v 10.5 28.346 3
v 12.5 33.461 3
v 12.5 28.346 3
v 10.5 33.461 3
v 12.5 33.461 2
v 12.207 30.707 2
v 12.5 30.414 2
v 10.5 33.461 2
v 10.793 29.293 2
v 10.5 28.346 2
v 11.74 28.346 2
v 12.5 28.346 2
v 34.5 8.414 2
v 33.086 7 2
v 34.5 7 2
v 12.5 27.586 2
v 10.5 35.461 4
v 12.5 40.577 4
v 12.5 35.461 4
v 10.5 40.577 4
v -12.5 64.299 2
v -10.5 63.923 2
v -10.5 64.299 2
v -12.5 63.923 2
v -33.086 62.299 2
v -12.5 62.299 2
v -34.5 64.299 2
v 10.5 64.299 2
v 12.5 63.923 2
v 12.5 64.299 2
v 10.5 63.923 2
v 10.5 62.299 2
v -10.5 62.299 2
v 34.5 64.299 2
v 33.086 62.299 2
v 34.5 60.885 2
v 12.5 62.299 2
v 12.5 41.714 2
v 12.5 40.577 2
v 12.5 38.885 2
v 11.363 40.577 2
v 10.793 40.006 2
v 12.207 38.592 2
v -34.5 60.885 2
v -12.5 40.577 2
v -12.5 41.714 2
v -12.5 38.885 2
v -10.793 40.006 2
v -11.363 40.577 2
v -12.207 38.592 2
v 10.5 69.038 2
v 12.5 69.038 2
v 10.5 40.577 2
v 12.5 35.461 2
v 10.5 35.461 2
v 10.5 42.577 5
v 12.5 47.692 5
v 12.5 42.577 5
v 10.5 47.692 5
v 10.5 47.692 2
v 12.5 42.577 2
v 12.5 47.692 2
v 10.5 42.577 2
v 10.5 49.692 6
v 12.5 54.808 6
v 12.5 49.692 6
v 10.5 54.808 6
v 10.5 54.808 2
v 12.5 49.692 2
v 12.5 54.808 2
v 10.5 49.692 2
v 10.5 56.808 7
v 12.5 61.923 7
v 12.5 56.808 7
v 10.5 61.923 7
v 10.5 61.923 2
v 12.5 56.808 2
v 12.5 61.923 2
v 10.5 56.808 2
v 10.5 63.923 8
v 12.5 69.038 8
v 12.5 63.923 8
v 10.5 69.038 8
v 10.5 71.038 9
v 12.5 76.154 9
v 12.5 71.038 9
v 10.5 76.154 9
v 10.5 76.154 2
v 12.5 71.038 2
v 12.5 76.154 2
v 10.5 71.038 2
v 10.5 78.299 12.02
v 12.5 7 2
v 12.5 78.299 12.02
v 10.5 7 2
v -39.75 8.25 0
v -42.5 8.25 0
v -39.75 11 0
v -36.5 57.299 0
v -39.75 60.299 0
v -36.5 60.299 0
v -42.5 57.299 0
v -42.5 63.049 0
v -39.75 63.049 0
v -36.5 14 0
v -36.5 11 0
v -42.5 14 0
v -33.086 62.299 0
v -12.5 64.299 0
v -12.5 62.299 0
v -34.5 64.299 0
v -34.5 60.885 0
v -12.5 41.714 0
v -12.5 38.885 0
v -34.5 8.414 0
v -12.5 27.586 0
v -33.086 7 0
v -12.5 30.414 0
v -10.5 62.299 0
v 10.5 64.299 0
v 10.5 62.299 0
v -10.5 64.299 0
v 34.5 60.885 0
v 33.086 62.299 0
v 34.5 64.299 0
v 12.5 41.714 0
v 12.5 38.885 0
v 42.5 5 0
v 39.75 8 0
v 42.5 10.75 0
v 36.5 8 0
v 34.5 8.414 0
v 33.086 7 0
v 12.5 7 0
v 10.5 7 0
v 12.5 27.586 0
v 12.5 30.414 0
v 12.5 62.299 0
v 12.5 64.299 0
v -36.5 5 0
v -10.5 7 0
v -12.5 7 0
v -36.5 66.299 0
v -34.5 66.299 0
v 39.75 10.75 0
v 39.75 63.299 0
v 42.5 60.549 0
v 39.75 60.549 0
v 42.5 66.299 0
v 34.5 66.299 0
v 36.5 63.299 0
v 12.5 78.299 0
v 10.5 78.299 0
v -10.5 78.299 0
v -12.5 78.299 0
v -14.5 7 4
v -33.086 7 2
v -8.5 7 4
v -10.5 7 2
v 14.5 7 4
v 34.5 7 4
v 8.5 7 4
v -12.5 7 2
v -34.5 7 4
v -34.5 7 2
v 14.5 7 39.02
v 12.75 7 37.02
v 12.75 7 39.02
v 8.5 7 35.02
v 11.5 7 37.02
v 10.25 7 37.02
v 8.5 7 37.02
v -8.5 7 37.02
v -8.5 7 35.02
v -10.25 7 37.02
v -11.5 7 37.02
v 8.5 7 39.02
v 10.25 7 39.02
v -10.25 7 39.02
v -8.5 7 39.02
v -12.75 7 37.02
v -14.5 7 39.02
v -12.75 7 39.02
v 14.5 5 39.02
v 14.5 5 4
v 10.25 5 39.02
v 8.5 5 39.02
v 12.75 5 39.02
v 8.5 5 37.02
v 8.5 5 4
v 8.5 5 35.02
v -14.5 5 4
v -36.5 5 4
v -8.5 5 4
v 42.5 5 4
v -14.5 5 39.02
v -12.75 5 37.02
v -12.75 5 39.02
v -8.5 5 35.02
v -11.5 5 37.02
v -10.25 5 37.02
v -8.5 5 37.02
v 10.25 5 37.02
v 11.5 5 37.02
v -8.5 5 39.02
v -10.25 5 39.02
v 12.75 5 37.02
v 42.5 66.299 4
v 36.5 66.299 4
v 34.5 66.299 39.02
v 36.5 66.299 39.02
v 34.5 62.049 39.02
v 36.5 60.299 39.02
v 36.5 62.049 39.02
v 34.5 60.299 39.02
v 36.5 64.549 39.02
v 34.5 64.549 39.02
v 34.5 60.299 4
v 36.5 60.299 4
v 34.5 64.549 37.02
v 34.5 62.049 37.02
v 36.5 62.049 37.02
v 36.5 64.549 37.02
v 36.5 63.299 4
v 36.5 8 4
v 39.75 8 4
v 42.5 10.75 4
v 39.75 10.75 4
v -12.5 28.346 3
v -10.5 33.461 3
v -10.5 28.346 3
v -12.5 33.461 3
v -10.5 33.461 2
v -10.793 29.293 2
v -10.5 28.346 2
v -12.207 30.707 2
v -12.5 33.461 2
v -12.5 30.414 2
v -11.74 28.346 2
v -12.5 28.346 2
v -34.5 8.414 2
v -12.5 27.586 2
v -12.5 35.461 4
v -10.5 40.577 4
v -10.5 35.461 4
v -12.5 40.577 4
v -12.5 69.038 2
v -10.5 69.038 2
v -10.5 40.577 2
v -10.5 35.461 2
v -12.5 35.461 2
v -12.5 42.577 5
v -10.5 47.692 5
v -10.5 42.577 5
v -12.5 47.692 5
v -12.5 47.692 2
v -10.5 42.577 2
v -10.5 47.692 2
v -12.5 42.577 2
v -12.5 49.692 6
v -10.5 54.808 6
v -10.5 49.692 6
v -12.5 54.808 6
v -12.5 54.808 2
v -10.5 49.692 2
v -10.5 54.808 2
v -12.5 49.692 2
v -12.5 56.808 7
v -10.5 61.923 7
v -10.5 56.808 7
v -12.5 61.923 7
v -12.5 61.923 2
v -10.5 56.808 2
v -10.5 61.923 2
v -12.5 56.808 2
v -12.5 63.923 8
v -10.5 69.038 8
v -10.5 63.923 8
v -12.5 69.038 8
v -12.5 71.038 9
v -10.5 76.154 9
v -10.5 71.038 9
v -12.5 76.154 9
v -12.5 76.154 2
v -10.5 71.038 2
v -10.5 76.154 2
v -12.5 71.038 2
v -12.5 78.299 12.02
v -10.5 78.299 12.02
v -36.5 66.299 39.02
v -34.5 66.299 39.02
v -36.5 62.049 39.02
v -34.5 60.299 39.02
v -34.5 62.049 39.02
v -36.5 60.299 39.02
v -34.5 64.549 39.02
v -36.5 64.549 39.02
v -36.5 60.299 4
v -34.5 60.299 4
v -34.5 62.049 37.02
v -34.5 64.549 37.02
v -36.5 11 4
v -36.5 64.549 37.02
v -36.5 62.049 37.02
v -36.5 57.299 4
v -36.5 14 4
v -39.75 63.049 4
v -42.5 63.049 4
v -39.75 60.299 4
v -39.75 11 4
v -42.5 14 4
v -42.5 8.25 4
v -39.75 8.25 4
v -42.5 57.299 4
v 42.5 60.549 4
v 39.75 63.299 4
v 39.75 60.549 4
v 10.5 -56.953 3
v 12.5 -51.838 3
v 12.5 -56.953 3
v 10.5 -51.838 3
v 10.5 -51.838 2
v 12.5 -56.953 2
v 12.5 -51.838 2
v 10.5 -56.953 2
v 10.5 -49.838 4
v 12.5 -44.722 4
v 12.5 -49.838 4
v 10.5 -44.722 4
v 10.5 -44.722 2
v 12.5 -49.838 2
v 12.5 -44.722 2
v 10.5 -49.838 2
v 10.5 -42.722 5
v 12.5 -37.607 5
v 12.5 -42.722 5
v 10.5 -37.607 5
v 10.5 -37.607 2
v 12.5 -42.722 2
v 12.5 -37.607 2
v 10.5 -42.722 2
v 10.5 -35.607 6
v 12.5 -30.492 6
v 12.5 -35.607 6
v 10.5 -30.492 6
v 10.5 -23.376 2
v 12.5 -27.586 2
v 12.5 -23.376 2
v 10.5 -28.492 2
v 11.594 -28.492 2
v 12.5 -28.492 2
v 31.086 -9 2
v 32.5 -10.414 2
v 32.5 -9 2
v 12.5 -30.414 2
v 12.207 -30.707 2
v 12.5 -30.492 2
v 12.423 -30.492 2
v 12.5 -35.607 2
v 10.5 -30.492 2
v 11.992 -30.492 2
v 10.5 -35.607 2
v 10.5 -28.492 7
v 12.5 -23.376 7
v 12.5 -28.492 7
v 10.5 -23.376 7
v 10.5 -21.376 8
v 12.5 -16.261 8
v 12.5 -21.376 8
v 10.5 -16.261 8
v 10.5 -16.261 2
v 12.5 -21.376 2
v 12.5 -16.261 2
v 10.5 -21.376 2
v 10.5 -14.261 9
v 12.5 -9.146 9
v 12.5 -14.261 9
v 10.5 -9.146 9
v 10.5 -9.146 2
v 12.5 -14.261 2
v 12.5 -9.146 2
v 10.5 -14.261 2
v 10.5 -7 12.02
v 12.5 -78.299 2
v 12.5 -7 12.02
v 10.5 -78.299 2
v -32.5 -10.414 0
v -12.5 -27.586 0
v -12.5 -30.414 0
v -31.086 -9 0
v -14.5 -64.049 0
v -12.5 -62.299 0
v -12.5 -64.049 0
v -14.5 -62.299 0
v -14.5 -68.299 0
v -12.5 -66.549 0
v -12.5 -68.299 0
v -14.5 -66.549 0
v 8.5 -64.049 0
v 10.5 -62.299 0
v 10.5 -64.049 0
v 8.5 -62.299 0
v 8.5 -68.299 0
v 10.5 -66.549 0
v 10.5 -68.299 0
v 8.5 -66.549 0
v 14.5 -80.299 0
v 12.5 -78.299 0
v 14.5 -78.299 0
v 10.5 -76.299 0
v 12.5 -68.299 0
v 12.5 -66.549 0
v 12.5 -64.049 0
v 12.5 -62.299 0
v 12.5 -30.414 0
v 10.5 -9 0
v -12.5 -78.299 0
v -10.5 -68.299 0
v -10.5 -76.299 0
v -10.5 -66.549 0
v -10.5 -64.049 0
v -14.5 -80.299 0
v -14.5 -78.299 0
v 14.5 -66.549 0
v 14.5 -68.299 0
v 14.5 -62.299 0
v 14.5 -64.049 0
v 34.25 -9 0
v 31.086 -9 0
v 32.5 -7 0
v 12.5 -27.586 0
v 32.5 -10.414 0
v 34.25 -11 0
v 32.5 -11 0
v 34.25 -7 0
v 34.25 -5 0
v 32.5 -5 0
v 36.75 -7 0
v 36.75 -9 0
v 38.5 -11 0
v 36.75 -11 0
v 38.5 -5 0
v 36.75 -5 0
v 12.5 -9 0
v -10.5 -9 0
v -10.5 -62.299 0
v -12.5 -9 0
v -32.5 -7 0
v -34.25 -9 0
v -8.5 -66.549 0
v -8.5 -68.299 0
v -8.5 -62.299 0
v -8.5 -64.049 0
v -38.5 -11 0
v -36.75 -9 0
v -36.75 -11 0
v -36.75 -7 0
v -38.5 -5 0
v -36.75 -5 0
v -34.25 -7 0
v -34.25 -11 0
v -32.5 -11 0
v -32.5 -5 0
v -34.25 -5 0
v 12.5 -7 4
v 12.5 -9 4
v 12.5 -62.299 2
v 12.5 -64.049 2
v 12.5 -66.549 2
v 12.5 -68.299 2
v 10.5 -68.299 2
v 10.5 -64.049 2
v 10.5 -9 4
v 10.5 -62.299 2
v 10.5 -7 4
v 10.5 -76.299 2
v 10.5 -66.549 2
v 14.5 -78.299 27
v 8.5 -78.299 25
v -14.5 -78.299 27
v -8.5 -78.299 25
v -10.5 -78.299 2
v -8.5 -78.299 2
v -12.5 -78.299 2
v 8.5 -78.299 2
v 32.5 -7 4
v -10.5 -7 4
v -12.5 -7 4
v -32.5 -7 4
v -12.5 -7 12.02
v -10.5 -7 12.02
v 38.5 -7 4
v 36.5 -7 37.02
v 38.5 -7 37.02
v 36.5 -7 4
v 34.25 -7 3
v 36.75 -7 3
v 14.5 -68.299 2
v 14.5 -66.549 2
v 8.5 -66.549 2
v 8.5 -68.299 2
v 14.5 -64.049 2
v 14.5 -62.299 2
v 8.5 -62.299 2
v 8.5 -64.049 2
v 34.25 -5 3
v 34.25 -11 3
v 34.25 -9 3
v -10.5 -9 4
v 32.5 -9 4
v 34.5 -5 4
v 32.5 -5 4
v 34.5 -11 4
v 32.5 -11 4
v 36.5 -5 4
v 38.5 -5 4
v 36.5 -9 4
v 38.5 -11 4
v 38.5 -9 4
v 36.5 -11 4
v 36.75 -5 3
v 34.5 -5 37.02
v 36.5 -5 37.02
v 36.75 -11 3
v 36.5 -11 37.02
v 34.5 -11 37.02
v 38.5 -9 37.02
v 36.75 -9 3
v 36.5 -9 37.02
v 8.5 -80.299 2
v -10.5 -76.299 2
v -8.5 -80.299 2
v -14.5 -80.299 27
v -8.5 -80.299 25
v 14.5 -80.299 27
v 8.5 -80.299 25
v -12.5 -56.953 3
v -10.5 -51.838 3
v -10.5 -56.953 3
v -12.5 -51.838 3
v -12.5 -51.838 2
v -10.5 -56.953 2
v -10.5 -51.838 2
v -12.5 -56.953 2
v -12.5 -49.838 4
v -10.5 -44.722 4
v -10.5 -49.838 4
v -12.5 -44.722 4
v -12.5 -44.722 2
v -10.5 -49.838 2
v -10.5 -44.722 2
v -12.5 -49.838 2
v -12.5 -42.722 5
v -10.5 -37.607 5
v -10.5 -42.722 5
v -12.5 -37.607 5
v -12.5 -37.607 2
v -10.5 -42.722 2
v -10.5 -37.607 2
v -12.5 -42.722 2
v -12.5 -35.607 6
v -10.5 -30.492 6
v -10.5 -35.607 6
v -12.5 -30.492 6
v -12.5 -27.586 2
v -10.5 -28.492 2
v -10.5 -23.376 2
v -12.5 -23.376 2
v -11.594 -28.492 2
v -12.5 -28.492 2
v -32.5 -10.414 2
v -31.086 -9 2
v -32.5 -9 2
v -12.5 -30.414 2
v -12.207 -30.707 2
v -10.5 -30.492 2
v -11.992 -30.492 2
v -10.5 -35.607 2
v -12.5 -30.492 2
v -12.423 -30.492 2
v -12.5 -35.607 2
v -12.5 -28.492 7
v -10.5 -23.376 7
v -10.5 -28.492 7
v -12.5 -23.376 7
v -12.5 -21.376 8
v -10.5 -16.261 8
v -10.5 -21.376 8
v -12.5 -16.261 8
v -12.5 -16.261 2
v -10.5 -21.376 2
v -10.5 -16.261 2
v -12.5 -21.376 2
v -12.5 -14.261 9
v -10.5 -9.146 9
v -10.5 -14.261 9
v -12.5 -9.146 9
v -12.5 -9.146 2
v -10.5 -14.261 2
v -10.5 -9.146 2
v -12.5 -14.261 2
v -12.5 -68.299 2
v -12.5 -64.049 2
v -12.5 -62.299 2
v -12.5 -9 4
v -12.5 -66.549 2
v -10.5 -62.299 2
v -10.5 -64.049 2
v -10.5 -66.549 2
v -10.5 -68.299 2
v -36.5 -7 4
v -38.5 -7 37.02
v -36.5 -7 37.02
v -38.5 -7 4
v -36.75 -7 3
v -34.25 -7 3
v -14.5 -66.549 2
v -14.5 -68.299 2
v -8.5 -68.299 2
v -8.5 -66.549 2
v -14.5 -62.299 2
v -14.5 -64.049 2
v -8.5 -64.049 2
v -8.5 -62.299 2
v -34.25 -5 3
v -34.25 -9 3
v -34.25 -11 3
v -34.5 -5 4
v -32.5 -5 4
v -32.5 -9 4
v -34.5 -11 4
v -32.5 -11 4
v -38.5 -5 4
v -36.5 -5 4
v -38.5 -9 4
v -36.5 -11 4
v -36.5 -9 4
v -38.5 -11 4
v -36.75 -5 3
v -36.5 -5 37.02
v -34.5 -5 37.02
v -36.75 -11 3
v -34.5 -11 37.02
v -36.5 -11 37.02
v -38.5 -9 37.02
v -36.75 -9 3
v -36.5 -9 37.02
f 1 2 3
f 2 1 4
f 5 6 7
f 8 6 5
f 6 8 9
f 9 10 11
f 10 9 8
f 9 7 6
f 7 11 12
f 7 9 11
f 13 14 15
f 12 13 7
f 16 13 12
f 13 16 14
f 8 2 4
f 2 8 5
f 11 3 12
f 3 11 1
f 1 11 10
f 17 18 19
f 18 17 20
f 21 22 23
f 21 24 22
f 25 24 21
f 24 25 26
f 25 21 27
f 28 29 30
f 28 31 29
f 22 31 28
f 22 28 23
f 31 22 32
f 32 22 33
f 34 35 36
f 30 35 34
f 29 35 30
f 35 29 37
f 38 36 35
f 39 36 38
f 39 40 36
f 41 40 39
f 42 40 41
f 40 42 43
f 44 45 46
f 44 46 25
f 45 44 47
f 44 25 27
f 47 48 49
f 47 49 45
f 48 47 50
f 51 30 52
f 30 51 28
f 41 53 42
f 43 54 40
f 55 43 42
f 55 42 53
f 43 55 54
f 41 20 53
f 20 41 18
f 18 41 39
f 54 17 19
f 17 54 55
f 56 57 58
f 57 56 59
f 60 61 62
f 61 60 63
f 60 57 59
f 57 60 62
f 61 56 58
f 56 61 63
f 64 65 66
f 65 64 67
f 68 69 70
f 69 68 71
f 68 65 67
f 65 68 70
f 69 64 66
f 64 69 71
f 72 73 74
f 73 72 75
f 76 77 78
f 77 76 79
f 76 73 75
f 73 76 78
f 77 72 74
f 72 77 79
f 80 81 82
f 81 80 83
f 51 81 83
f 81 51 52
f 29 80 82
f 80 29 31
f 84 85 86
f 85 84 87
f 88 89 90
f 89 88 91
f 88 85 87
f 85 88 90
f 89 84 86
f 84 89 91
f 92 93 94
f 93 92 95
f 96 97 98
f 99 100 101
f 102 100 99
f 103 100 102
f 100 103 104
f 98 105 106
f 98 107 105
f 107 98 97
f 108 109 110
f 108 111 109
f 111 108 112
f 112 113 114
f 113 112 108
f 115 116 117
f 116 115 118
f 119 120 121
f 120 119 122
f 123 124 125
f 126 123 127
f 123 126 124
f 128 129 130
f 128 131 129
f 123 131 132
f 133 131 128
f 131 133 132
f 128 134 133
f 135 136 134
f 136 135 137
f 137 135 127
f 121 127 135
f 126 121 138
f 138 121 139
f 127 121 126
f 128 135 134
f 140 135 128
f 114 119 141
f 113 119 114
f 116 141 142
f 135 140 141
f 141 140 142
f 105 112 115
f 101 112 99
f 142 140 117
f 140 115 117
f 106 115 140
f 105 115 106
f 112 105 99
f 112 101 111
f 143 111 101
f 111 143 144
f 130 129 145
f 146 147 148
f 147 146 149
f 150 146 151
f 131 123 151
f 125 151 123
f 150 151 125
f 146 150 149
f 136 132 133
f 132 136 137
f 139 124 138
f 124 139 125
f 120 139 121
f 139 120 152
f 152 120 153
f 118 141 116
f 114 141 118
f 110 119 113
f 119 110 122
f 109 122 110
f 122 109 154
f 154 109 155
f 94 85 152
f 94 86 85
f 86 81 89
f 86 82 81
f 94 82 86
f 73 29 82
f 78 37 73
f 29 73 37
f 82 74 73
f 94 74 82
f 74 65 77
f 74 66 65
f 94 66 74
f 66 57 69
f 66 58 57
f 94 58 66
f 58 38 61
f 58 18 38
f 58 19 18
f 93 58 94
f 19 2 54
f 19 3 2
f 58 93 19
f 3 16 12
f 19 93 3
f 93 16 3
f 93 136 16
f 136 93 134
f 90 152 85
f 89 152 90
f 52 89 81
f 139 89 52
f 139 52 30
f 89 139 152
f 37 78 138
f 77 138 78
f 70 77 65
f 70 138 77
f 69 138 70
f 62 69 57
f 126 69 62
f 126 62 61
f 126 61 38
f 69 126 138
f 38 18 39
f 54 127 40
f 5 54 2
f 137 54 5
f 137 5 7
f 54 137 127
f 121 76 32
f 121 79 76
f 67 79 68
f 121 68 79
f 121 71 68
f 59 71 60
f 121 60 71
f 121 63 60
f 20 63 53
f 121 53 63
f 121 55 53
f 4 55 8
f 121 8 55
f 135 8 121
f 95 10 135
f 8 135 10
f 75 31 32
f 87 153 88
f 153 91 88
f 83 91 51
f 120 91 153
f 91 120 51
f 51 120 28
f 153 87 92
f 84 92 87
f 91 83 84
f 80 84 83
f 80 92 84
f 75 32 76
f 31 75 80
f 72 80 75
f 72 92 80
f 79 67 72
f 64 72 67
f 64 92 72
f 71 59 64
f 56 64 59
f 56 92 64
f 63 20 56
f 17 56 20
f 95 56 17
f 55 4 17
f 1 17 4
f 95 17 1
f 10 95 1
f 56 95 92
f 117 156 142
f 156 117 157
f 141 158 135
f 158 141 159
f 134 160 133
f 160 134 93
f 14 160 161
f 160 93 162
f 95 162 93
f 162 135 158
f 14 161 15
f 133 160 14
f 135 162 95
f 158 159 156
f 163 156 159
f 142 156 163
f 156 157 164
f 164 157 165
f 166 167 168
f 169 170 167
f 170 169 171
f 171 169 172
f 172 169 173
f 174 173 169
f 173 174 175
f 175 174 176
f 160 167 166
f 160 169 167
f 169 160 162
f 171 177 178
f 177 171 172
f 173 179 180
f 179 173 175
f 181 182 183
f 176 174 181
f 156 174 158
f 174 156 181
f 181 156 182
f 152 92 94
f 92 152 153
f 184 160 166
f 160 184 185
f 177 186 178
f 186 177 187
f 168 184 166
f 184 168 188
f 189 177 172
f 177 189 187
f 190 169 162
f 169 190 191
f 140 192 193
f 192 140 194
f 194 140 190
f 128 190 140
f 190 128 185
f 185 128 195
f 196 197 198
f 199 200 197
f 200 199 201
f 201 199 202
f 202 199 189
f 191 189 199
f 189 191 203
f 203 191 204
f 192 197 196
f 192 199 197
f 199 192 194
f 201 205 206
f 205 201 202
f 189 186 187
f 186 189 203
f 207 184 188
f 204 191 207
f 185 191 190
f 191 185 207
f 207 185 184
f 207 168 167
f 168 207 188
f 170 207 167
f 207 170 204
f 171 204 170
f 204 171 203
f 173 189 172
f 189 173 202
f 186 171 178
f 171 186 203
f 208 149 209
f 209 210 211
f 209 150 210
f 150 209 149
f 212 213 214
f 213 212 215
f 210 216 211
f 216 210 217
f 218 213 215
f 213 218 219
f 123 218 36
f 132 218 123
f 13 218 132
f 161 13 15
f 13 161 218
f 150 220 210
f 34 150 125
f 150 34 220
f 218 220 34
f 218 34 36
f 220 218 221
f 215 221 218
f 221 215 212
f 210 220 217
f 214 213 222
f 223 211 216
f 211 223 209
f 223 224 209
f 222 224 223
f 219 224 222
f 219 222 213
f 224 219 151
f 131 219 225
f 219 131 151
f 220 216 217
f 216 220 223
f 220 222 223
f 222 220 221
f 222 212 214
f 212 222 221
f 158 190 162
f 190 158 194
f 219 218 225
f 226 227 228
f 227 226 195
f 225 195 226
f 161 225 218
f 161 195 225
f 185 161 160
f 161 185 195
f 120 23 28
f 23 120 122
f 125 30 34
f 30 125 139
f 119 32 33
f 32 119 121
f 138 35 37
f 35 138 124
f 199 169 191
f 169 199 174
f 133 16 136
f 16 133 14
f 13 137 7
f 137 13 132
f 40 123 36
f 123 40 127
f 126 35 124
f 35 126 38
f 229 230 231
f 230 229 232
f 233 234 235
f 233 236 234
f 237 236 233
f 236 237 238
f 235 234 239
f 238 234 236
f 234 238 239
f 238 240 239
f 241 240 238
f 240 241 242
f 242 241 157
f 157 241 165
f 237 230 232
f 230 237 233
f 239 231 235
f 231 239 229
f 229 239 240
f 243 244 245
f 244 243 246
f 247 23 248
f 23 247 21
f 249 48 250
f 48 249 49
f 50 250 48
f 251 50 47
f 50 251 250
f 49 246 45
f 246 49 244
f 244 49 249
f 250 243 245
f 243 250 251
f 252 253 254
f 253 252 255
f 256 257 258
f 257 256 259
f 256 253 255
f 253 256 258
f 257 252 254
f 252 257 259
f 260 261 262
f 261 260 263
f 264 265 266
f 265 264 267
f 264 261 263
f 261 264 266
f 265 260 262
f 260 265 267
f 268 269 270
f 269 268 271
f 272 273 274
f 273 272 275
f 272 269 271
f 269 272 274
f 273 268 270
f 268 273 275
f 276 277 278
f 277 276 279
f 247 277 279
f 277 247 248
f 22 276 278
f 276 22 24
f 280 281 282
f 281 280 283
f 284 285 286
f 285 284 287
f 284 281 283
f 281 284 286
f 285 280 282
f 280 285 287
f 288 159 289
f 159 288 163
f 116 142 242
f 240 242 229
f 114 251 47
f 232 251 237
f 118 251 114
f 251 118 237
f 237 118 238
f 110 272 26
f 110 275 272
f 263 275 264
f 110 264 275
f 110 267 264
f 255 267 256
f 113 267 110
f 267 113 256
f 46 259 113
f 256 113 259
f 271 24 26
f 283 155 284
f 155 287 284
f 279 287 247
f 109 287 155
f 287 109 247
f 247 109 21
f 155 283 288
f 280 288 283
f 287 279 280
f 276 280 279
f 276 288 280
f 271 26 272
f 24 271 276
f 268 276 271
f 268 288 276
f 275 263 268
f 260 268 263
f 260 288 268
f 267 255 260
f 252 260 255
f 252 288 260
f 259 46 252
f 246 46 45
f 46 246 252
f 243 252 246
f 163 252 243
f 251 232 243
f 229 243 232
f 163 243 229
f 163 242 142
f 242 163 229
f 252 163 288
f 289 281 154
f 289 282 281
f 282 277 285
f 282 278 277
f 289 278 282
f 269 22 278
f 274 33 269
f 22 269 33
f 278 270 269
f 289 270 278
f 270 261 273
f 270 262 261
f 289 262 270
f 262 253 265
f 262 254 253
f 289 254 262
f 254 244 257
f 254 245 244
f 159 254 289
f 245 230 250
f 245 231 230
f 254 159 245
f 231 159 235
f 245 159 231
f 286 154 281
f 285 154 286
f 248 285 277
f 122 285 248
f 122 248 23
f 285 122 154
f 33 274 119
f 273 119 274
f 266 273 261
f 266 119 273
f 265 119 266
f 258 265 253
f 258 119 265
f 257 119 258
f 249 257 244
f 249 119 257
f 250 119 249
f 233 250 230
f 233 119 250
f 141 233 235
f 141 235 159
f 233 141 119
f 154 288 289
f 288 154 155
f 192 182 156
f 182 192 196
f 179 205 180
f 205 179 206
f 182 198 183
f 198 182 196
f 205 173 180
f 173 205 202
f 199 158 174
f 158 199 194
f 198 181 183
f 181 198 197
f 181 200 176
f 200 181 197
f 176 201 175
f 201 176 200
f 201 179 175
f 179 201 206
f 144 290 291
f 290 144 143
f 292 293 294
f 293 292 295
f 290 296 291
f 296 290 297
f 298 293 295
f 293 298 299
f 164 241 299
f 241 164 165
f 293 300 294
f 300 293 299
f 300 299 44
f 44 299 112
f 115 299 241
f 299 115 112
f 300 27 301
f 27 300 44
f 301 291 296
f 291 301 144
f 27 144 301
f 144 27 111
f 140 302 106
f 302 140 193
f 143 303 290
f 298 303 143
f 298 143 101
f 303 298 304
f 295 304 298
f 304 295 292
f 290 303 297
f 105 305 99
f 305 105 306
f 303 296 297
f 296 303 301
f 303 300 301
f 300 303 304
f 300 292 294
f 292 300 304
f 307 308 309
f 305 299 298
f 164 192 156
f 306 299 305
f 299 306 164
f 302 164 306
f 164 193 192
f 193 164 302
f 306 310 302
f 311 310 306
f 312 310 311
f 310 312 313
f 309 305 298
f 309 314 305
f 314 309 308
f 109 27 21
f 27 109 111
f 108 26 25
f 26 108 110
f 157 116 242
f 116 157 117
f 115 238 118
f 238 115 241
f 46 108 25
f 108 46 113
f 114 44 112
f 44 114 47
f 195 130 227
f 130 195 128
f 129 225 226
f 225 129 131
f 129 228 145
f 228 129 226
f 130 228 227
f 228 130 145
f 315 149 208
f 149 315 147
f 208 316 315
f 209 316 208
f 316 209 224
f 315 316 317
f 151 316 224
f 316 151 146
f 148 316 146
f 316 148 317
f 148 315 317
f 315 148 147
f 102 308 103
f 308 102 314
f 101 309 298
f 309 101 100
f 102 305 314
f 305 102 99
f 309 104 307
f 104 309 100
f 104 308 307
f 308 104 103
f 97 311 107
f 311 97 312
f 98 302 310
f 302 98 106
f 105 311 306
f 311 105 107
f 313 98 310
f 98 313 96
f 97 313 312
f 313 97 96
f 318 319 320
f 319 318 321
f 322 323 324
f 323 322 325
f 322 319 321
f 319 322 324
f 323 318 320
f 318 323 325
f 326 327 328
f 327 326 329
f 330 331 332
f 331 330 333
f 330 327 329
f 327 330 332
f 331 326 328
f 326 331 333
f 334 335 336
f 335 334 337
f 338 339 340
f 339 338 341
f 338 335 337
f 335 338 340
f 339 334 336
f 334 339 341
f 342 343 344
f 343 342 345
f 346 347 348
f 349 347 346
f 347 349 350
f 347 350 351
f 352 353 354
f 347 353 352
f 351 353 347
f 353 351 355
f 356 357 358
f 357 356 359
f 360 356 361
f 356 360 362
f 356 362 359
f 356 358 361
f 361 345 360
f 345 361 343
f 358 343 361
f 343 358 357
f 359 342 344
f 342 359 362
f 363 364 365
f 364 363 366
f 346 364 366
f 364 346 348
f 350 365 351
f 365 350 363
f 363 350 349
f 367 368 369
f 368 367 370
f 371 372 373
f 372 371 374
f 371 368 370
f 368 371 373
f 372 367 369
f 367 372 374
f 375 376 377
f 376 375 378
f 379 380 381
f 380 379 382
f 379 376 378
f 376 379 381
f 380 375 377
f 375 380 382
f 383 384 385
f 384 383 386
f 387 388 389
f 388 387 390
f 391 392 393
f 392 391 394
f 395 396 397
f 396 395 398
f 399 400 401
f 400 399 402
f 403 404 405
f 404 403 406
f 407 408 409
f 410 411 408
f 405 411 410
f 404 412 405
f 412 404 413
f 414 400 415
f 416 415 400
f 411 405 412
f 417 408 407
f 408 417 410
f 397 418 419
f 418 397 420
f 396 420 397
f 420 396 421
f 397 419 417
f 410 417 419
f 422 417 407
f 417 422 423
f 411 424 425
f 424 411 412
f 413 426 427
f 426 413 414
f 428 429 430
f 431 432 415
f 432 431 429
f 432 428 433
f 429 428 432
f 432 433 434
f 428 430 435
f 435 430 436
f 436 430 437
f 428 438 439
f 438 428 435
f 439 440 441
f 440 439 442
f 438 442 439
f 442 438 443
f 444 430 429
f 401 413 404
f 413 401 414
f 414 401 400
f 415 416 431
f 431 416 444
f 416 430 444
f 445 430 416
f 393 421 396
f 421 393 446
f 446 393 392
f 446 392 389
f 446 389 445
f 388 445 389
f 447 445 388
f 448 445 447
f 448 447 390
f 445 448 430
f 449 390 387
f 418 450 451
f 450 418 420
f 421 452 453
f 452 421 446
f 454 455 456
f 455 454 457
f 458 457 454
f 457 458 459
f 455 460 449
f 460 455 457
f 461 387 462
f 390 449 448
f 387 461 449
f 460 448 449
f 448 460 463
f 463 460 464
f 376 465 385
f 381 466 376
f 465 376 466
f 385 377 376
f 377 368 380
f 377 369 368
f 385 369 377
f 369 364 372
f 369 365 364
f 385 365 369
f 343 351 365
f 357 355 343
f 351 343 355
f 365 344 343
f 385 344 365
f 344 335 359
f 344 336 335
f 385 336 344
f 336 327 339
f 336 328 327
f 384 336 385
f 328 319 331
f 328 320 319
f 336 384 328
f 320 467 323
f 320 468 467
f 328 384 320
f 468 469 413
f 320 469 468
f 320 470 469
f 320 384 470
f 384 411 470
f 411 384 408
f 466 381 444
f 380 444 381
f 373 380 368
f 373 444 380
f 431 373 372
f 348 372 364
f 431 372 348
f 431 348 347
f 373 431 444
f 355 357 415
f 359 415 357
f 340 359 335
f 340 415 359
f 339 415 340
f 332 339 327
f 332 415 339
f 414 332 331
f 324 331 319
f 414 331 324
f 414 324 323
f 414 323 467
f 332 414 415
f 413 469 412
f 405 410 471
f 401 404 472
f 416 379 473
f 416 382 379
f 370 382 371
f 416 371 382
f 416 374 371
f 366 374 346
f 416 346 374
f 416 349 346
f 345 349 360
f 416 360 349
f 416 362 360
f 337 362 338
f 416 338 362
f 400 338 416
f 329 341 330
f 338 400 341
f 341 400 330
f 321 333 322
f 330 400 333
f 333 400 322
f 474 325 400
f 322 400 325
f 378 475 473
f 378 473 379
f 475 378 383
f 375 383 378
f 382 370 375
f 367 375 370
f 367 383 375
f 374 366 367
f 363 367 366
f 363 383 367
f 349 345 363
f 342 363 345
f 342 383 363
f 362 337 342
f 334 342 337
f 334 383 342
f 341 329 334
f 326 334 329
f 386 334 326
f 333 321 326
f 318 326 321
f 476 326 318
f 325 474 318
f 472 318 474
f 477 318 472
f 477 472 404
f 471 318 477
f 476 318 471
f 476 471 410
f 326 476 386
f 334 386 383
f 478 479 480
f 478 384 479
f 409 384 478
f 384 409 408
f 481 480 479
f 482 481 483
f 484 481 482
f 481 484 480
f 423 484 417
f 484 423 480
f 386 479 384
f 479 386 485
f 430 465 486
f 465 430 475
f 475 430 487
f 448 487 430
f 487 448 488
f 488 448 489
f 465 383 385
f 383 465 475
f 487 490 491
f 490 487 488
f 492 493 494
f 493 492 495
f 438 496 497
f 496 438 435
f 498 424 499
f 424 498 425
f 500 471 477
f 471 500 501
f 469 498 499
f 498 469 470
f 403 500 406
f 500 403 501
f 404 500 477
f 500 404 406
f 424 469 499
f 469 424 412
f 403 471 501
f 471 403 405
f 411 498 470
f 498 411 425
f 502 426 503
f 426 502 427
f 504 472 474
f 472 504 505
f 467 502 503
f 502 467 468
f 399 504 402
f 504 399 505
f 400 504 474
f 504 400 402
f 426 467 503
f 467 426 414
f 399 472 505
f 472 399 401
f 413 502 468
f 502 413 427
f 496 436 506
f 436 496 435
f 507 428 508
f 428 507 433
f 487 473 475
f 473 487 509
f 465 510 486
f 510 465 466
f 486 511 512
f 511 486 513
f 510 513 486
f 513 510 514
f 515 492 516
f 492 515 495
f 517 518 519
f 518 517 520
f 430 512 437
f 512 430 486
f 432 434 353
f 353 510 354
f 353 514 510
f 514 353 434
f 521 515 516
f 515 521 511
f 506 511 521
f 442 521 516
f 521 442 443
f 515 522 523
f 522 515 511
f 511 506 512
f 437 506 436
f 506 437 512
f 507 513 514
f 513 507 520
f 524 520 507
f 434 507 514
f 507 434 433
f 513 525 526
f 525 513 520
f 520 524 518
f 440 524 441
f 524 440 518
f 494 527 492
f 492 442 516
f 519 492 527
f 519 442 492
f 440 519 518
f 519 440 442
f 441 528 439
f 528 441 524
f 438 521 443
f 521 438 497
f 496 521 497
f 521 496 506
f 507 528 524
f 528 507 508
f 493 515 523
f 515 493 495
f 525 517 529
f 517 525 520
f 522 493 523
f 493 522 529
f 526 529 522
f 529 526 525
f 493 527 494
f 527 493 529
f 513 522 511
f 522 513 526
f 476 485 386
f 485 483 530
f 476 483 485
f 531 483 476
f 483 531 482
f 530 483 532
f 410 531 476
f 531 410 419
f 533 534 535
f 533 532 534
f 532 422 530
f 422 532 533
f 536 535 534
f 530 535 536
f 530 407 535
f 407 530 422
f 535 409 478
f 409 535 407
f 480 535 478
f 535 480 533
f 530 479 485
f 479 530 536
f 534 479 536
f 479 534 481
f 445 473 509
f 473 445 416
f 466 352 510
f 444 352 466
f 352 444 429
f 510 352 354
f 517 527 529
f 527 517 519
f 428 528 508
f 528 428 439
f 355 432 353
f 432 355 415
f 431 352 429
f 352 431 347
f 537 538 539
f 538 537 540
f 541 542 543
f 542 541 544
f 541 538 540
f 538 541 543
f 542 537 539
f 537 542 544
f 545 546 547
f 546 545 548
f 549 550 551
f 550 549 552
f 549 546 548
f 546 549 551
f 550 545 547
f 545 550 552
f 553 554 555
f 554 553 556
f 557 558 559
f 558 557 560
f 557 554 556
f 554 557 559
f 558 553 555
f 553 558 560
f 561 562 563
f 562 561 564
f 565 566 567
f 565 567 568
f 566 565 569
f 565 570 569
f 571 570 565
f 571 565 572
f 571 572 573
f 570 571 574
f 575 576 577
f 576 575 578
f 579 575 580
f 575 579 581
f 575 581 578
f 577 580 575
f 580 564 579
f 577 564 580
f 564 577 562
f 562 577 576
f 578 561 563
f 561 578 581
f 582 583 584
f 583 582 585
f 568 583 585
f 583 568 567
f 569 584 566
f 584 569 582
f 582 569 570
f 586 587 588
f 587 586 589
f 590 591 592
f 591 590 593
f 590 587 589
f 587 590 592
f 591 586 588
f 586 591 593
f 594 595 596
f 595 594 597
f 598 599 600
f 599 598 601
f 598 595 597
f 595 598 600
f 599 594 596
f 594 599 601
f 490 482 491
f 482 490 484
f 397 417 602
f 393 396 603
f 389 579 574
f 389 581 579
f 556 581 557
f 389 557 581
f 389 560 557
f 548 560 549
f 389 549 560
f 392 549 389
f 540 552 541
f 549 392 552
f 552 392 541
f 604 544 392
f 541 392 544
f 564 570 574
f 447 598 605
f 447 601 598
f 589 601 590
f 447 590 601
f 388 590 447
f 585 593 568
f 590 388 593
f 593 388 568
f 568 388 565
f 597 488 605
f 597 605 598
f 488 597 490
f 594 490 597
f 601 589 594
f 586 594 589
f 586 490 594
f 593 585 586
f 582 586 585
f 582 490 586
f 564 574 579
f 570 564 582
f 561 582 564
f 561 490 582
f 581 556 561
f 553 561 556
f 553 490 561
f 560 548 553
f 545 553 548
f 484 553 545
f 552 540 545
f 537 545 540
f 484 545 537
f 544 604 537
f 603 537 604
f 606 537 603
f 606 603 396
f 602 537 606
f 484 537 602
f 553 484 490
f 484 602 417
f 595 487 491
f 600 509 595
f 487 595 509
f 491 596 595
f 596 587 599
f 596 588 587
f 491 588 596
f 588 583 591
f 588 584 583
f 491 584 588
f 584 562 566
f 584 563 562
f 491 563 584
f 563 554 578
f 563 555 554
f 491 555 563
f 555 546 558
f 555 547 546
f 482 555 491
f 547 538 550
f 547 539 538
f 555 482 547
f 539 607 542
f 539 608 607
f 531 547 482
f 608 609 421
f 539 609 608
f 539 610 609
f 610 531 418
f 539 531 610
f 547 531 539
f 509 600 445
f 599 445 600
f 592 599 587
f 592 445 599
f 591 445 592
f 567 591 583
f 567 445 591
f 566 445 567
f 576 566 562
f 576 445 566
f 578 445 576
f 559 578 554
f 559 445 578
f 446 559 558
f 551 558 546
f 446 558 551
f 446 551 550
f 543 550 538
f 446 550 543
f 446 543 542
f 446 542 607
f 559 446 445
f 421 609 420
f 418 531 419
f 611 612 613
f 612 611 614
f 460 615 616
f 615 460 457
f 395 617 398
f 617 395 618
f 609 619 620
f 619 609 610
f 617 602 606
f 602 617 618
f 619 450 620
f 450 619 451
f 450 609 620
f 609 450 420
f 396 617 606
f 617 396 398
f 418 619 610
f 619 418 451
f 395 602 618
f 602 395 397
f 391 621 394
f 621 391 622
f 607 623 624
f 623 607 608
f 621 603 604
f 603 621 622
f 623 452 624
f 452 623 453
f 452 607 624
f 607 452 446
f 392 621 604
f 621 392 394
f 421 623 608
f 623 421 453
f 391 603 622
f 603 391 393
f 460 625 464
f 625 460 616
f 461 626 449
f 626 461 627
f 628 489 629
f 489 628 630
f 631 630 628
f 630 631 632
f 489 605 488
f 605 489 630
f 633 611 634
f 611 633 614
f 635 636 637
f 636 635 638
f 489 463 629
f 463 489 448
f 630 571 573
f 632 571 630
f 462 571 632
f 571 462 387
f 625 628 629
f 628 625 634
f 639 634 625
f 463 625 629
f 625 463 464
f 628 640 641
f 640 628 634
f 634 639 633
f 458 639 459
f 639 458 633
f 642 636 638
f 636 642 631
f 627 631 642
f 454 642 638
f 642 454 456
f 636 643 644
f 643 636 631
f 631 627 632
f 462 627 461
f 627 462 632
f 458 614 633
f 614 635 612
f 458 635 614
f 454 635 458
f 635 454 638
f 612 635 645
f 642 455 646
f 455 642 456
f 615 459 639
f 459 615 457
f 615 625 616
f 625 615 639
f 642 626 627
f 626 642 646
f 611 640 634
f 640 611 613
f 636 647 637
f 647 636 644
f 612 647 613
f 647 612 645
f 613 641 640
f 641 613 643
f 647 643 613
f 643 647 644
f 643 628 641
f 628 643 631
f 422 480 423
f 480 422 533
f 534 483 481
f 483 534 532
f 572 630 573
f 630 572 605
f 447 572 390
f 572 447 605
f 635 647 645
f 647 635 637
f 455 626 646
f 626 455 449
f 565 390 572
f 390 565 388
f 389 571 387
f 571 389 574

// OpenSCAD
/* [Main] */

// What would you like to generate?
part = "both"; // [base:Base Only,top:Top Only,both:Base and Top]

// Number of holders
holder_count = 1;

// Width of cards to be used (mm)
card_width = 64;

// Length of cards to be used (mm)
card_length = 88;

// Height of holder (approx height of deck) (mm)
holder_height = 25;	// Height of holder

/* [Tweaking] */

// How far back the top layer should be (mm)
top_offset = 14;
// How much the cards overhang the ends of the holder (mm)
overhang = 16;
// The angle of the angled supports (degrees)
angle = 8;
// Gap added to card with to give width of holder (mm)
card_gap = 5;
// Thickness of support bars (mm)
bar_thickness = 2;
// Gap to allow top/bottom to clip together (mm)
support_gap = 0.25;
// Gap to allow clips to clip together (mm)
clip_card_gap = 0.25;
// Distance between top and bottom if printing both (mm)
both_gap = 10;


/****************************************
 *
 ****************************************/

// Internal width of holder
holder_width = card_width + card_gap;
// Length of angled support
angled_length = cos(angle) * (card_length - overhang);;
// Height of angled support
angled_height = (tan(angle) * angled_length) + bar_thickness;
// Length of base (for side bars)
base_length = angled_length - top_offset;
// Full length of base
base_full_length = angled_length + bar_thickness;
// Full length of top
top_full_length = angled_length + (bar_thickness * 2);
// Thickness of clips
clip_thickness = bar_thickness * 1.5;
// Offset of angled support from middle (1/6th from 1/2 = 1/3rd!)
offset = (holder_width) / 6;
// Offset for diagonal bars
diag_offset = sin(45) * bar_thickness;

print_part();

/****************************************
 * Generate the selected part
 ****************************************/
module print_part()
{
	if (part == "base")
	{
		bases();
	} else if (part == "top") {
		tops();
	} else if (part == "both") {
		// translate stuff here...
		translate([0, (base_full_length + both_gap) / 2, 0])
			bases();
		translate([0, -(top_full_length + both_gap) / 2, 0])
			tops();
	}
}

/****************************************
 * Generate the correct number of tops
 ****************************************/
module tops()
{
	// Calculate the full width of the tops
	full_width = (holder_width + bar_thickness) * (holder_count) + (bar_thickness * 3);
	// Centre the tops around zero
	translate([full_width/2, -top_full_length/2, 0])
	{
		// Draw each top
		for(i=[1:holder_count])
		{
			translate([-(holder_width + bar_thickness) * (i-1),0,0])
				singleTop();
		}

		// Thicker bars at ends
		translate([-bar_thickness, angled_length, 0])
		{
			cube([bar_thickness, bar_thickness, holder_height + angled_height]);
		}
		translate([-full_width, angled_length, 0])
		{
			cube([bar_thickness, bar_thickness, holder_height + angled_height]);
		}
	}
}

/****************************************
 * Generate a single top holder
 ****************************************/
module singleTop()
{
	// Length of diagonal bar
	diag_length = 
		(
			(offset*2 - bar_thickness)	// Distance between middle of angled support
												// 	and inside edge of side bar
			+ (diag_offset/2) 				// Distance from inside edge of side bar 
												//		to rotation axis of diagional bar
			+ (bar_thickness-diag_offset)	// Distance from rotation axis 
												//		to centre of diagonal bar
		) / sin(45);

	// Move the holder to start at [0,0,0]
	translate([-holder_width/2-(bar_thickness*2),0,0])
	{
		// As the base is mirrored down the middle, do a side at a time
		for (m=[[0,0,0],[1,0,0]])
		{
			mirror(m)
			{
				// Bar at back
				cube([offset, bar_thickness * 2, bar_thickness]);

				// Support at back
				translate([offset-(bar_thickness * 1.5),0,0])
					cube([bar_thickness * 3, bar_thickness, holder_height + bar_thickness]);
				translate([0,0,holder_height])
					cube([offset, bar_thickness, bar_thickness]);

				// Angled Support
				translate([offset-(bar_thickness * 0.5),bar_thickness,0])
					angledSupport();

				// Notches
				translate([offset-(bar_thickness * 1.5), 0, 0])
				{
					for(s=[
								[0, top_offset - bar_thickness, 0],
								[0, top_offset + bar_thickness + support_gap, 0]
							])
					{
						translate(s)
							cube([bar_thickness * 3, bar_thickness - support_gap, bar_thickness]);
					}
				}

				// Bar at front
				translate([0, angled_length, 0])
					cube([holder_width/2 + (bar_thickness * 2), bar_thickness, bar_thickness * 2]);

				// Front support
				translate([holder_width/2 - bar_thickness, angled_length - bar_thickness, 0])
				{
					for(t=[
							[0, 0, 0],
							[bar_thickness*2 + support_gap, 0, 0]
						])
					{
						translate(t)
							cube([bar_thickness - support_gap, bar_thickness * 3, bar_thickness * 2]);
					}

					translate([0, 0, bar_thickness * 1.5])
						cube([bar_thickness * 3, bar_thickness * 3, bar_thickness * 0.5]);

					// Vertical support
					translate([bar_thickness,0,bar_thickness * 1.5])
					{
						cube([bar_thickness, 
								bar_thickness * 3, 
								holder_height + angled_height - (bar_thickness * 1.5)]);
					}
				}

				// Diagonal supports
				translate([holder_width/2, angled_length + bar_thickness - diag_offset, 0])
					rotate([0,0,135])
						cube([bar_thickness,diag_length,bar_thickness]);
			}
		}
	}	
}

/****************************************
 * Generate the correct number of bases
 ****************************************/
module bases()
{
	// Move bases so generated object is in middle of area
	translate([
			((holder_width * holder_count) + (bar_thickness * (holder_count + 1)))/2,
			-base_full_length/2,
			0])
	{
		// Draw each base
		for(i=[1:holder_count])
		{
			translate([-(holder_width + bar_thickness) * (i-1),0,0])
				singleBase();
		}

		// Add the clips - all mirrored/rotated in their own way

		clip();

		translate([0,base_length + (bar_thickness * 2),0])
			mirror([0,1,0])
				clip();	

		translate([-(holder_width + bar_thickness) * (holder_count) - bar_thickness,
						base_length + (bar_thickness * 2) - (clip_thickness * 3),
						0])
			mirror([1,0,0])
				clip();

		translate([-(holder_width + bar_thickness) * (holder_count) - bar_thickness,
						(clip_thickness * 3),
						0])
			rotate([0,0,180])
				clip();

	}
}

/****************************************
 * Generate a single base
 ****************************************/
module singleBase()
{
	// Length of diagonal bar
	diag_length = 
		(
			(offset*2) 						// Distance between middle of angled support
												// 	and inside edge of side bar
			+ (diag_offset/2) 				// Distance from inside edge of side bar 
												//		to rotation axis of diagional bar
			+ (bar_thickness-diag_offset)	// Distance from rotation axis 
												//		to centre of diagonal bar
		) / sin(45);

	// Move so the base is at [0,0,0]
	translate([-holder_width/2-bar_thickness,0,0])
	{
		// As the base is mirrored down the middle, do a side at a time
		for (m=[[0,0,0],[1,0,0]])
		{
			mirror(m)
			{
				// Bar at back
				cube([holder_width/2, bar_thickness, bar_thickness * 2]);
				// Bar at front
				translate([0,base_length,0])
					cube([holder_width/2, bar_thickness, bar_thickness]);
				// Bar at top of back support
				translate([0,0,holder_height + angled_height - bar_thickness])
					cube([offset, bar_thickness, bar_thickness]);		

				// Side bar
				translate([holder_width/2,0,0])
					cube([bar_thickness, base_length + bar_thickness, bar_thickness * 2]);

				// angled Support
				translate([offset-(bar_thickness * 0.5),bar_thickness,0])
					angledSupport();

				// Back support
				translate([offset-(bar_thickness * 1.5),0,0])
					verticalSupport();
				// Front support
				translate([holder_width/2 + bar_thickness,base_length - bar_thickness,0])
					rotate([0,0,90])
						verticalSupport();

				// Diagonal at back
				translate([holder_width/2 + (bar_thickness - diag_offset), 0, 0])
					rotate([0,0,45])
						cube([bar_thickness,diag_length,bar_thickness]);
				// Diagonal at front
				translate([holder_width/2 + bar_thickness, base_length + bar_thickness - diag_offset, 0])
					rotate([0,0,135])
						cube([bar_thickness,diag_length,bar_thickness]);
			}
		}
	}
}

/****************************************
 * Angled support for cards to sit on
 ****************************************/
module angledSupport()
{
	// Calculate the maximum height of holes
	max_hole = floor(
		((angled_length - (bar_thickness * 2)) * tan(angle))
		- bar_thickness);

	difference()
	{
		// The triangle, with a bar of bar_thickness underneath
		polyhedron(points=[ 
			[0,0,0], [bar_thickness,0,0], 
			[0,angled_length,0], [bar_thickness,angled_length,0],
			[0,angled_length,angled_height], [bar_thickness,angled_length,angled_height],
			[0,0,bar_thickness], [bar_thickness,0,bar_thickness] ],
			// ONLY STILL TRIANGLES FOR THINGIVERSE CUSTOMIZER!
			triangles=[
				[0,1,2], [1,3,2],
				[2,3,5], [2,5,4],
				[4,5,6], [5,7,6],
				[0,6,1], [6,7,1],
				[0,2,6], [2,4,6],
				[3,1,7], [5,3,7]
		]);

		// Step through heights of holes and add them
		if(max_hole>0)
		{
			for (v=[bar_thickness+1:bar_thickness+max_hole])
			{
				translate([-0.1, v/tan(angle), bar_thickness])
					cube([bar_thickness + 0.2, 
							min((v+1)/tan(angle), angled_length)
								-(v/tan(angle))
								-bar_thickness,
							(v-bar_thickness)]);
			}
		}
	}
}

/****************************************
 * A single vertical support for the base (with notches on the top)
 ****************************************/
module verticalSupport()
{
	difference() {
		cube([bar_thickness*3,bar_thickness,holder_height + angled_height + bar_thickness]);
		translate([bar_thickness-support_gap,0,holder_height + angled_height]) {
			cube([bar_thickness+(support_gap * 2),bar_thickness,bar_thickness * 1.1]);
		}
	}
}

/****************************************
 * A single clip, to clip multiple bases together
 ****************************************/
module clip()
{
	translate([-bar_thickness,0,0])
		cube([clip_thickness * 2 + bar_thickness, clip_thickness, bar_thickness * 2]);
	translate([clip_thickness + clip_card_gap, clip_thickness, 0])
		cube([clip_thickness - clip_card_gap, clip_thickness - clip_card_gap, bar_thickness * 2]);
}


